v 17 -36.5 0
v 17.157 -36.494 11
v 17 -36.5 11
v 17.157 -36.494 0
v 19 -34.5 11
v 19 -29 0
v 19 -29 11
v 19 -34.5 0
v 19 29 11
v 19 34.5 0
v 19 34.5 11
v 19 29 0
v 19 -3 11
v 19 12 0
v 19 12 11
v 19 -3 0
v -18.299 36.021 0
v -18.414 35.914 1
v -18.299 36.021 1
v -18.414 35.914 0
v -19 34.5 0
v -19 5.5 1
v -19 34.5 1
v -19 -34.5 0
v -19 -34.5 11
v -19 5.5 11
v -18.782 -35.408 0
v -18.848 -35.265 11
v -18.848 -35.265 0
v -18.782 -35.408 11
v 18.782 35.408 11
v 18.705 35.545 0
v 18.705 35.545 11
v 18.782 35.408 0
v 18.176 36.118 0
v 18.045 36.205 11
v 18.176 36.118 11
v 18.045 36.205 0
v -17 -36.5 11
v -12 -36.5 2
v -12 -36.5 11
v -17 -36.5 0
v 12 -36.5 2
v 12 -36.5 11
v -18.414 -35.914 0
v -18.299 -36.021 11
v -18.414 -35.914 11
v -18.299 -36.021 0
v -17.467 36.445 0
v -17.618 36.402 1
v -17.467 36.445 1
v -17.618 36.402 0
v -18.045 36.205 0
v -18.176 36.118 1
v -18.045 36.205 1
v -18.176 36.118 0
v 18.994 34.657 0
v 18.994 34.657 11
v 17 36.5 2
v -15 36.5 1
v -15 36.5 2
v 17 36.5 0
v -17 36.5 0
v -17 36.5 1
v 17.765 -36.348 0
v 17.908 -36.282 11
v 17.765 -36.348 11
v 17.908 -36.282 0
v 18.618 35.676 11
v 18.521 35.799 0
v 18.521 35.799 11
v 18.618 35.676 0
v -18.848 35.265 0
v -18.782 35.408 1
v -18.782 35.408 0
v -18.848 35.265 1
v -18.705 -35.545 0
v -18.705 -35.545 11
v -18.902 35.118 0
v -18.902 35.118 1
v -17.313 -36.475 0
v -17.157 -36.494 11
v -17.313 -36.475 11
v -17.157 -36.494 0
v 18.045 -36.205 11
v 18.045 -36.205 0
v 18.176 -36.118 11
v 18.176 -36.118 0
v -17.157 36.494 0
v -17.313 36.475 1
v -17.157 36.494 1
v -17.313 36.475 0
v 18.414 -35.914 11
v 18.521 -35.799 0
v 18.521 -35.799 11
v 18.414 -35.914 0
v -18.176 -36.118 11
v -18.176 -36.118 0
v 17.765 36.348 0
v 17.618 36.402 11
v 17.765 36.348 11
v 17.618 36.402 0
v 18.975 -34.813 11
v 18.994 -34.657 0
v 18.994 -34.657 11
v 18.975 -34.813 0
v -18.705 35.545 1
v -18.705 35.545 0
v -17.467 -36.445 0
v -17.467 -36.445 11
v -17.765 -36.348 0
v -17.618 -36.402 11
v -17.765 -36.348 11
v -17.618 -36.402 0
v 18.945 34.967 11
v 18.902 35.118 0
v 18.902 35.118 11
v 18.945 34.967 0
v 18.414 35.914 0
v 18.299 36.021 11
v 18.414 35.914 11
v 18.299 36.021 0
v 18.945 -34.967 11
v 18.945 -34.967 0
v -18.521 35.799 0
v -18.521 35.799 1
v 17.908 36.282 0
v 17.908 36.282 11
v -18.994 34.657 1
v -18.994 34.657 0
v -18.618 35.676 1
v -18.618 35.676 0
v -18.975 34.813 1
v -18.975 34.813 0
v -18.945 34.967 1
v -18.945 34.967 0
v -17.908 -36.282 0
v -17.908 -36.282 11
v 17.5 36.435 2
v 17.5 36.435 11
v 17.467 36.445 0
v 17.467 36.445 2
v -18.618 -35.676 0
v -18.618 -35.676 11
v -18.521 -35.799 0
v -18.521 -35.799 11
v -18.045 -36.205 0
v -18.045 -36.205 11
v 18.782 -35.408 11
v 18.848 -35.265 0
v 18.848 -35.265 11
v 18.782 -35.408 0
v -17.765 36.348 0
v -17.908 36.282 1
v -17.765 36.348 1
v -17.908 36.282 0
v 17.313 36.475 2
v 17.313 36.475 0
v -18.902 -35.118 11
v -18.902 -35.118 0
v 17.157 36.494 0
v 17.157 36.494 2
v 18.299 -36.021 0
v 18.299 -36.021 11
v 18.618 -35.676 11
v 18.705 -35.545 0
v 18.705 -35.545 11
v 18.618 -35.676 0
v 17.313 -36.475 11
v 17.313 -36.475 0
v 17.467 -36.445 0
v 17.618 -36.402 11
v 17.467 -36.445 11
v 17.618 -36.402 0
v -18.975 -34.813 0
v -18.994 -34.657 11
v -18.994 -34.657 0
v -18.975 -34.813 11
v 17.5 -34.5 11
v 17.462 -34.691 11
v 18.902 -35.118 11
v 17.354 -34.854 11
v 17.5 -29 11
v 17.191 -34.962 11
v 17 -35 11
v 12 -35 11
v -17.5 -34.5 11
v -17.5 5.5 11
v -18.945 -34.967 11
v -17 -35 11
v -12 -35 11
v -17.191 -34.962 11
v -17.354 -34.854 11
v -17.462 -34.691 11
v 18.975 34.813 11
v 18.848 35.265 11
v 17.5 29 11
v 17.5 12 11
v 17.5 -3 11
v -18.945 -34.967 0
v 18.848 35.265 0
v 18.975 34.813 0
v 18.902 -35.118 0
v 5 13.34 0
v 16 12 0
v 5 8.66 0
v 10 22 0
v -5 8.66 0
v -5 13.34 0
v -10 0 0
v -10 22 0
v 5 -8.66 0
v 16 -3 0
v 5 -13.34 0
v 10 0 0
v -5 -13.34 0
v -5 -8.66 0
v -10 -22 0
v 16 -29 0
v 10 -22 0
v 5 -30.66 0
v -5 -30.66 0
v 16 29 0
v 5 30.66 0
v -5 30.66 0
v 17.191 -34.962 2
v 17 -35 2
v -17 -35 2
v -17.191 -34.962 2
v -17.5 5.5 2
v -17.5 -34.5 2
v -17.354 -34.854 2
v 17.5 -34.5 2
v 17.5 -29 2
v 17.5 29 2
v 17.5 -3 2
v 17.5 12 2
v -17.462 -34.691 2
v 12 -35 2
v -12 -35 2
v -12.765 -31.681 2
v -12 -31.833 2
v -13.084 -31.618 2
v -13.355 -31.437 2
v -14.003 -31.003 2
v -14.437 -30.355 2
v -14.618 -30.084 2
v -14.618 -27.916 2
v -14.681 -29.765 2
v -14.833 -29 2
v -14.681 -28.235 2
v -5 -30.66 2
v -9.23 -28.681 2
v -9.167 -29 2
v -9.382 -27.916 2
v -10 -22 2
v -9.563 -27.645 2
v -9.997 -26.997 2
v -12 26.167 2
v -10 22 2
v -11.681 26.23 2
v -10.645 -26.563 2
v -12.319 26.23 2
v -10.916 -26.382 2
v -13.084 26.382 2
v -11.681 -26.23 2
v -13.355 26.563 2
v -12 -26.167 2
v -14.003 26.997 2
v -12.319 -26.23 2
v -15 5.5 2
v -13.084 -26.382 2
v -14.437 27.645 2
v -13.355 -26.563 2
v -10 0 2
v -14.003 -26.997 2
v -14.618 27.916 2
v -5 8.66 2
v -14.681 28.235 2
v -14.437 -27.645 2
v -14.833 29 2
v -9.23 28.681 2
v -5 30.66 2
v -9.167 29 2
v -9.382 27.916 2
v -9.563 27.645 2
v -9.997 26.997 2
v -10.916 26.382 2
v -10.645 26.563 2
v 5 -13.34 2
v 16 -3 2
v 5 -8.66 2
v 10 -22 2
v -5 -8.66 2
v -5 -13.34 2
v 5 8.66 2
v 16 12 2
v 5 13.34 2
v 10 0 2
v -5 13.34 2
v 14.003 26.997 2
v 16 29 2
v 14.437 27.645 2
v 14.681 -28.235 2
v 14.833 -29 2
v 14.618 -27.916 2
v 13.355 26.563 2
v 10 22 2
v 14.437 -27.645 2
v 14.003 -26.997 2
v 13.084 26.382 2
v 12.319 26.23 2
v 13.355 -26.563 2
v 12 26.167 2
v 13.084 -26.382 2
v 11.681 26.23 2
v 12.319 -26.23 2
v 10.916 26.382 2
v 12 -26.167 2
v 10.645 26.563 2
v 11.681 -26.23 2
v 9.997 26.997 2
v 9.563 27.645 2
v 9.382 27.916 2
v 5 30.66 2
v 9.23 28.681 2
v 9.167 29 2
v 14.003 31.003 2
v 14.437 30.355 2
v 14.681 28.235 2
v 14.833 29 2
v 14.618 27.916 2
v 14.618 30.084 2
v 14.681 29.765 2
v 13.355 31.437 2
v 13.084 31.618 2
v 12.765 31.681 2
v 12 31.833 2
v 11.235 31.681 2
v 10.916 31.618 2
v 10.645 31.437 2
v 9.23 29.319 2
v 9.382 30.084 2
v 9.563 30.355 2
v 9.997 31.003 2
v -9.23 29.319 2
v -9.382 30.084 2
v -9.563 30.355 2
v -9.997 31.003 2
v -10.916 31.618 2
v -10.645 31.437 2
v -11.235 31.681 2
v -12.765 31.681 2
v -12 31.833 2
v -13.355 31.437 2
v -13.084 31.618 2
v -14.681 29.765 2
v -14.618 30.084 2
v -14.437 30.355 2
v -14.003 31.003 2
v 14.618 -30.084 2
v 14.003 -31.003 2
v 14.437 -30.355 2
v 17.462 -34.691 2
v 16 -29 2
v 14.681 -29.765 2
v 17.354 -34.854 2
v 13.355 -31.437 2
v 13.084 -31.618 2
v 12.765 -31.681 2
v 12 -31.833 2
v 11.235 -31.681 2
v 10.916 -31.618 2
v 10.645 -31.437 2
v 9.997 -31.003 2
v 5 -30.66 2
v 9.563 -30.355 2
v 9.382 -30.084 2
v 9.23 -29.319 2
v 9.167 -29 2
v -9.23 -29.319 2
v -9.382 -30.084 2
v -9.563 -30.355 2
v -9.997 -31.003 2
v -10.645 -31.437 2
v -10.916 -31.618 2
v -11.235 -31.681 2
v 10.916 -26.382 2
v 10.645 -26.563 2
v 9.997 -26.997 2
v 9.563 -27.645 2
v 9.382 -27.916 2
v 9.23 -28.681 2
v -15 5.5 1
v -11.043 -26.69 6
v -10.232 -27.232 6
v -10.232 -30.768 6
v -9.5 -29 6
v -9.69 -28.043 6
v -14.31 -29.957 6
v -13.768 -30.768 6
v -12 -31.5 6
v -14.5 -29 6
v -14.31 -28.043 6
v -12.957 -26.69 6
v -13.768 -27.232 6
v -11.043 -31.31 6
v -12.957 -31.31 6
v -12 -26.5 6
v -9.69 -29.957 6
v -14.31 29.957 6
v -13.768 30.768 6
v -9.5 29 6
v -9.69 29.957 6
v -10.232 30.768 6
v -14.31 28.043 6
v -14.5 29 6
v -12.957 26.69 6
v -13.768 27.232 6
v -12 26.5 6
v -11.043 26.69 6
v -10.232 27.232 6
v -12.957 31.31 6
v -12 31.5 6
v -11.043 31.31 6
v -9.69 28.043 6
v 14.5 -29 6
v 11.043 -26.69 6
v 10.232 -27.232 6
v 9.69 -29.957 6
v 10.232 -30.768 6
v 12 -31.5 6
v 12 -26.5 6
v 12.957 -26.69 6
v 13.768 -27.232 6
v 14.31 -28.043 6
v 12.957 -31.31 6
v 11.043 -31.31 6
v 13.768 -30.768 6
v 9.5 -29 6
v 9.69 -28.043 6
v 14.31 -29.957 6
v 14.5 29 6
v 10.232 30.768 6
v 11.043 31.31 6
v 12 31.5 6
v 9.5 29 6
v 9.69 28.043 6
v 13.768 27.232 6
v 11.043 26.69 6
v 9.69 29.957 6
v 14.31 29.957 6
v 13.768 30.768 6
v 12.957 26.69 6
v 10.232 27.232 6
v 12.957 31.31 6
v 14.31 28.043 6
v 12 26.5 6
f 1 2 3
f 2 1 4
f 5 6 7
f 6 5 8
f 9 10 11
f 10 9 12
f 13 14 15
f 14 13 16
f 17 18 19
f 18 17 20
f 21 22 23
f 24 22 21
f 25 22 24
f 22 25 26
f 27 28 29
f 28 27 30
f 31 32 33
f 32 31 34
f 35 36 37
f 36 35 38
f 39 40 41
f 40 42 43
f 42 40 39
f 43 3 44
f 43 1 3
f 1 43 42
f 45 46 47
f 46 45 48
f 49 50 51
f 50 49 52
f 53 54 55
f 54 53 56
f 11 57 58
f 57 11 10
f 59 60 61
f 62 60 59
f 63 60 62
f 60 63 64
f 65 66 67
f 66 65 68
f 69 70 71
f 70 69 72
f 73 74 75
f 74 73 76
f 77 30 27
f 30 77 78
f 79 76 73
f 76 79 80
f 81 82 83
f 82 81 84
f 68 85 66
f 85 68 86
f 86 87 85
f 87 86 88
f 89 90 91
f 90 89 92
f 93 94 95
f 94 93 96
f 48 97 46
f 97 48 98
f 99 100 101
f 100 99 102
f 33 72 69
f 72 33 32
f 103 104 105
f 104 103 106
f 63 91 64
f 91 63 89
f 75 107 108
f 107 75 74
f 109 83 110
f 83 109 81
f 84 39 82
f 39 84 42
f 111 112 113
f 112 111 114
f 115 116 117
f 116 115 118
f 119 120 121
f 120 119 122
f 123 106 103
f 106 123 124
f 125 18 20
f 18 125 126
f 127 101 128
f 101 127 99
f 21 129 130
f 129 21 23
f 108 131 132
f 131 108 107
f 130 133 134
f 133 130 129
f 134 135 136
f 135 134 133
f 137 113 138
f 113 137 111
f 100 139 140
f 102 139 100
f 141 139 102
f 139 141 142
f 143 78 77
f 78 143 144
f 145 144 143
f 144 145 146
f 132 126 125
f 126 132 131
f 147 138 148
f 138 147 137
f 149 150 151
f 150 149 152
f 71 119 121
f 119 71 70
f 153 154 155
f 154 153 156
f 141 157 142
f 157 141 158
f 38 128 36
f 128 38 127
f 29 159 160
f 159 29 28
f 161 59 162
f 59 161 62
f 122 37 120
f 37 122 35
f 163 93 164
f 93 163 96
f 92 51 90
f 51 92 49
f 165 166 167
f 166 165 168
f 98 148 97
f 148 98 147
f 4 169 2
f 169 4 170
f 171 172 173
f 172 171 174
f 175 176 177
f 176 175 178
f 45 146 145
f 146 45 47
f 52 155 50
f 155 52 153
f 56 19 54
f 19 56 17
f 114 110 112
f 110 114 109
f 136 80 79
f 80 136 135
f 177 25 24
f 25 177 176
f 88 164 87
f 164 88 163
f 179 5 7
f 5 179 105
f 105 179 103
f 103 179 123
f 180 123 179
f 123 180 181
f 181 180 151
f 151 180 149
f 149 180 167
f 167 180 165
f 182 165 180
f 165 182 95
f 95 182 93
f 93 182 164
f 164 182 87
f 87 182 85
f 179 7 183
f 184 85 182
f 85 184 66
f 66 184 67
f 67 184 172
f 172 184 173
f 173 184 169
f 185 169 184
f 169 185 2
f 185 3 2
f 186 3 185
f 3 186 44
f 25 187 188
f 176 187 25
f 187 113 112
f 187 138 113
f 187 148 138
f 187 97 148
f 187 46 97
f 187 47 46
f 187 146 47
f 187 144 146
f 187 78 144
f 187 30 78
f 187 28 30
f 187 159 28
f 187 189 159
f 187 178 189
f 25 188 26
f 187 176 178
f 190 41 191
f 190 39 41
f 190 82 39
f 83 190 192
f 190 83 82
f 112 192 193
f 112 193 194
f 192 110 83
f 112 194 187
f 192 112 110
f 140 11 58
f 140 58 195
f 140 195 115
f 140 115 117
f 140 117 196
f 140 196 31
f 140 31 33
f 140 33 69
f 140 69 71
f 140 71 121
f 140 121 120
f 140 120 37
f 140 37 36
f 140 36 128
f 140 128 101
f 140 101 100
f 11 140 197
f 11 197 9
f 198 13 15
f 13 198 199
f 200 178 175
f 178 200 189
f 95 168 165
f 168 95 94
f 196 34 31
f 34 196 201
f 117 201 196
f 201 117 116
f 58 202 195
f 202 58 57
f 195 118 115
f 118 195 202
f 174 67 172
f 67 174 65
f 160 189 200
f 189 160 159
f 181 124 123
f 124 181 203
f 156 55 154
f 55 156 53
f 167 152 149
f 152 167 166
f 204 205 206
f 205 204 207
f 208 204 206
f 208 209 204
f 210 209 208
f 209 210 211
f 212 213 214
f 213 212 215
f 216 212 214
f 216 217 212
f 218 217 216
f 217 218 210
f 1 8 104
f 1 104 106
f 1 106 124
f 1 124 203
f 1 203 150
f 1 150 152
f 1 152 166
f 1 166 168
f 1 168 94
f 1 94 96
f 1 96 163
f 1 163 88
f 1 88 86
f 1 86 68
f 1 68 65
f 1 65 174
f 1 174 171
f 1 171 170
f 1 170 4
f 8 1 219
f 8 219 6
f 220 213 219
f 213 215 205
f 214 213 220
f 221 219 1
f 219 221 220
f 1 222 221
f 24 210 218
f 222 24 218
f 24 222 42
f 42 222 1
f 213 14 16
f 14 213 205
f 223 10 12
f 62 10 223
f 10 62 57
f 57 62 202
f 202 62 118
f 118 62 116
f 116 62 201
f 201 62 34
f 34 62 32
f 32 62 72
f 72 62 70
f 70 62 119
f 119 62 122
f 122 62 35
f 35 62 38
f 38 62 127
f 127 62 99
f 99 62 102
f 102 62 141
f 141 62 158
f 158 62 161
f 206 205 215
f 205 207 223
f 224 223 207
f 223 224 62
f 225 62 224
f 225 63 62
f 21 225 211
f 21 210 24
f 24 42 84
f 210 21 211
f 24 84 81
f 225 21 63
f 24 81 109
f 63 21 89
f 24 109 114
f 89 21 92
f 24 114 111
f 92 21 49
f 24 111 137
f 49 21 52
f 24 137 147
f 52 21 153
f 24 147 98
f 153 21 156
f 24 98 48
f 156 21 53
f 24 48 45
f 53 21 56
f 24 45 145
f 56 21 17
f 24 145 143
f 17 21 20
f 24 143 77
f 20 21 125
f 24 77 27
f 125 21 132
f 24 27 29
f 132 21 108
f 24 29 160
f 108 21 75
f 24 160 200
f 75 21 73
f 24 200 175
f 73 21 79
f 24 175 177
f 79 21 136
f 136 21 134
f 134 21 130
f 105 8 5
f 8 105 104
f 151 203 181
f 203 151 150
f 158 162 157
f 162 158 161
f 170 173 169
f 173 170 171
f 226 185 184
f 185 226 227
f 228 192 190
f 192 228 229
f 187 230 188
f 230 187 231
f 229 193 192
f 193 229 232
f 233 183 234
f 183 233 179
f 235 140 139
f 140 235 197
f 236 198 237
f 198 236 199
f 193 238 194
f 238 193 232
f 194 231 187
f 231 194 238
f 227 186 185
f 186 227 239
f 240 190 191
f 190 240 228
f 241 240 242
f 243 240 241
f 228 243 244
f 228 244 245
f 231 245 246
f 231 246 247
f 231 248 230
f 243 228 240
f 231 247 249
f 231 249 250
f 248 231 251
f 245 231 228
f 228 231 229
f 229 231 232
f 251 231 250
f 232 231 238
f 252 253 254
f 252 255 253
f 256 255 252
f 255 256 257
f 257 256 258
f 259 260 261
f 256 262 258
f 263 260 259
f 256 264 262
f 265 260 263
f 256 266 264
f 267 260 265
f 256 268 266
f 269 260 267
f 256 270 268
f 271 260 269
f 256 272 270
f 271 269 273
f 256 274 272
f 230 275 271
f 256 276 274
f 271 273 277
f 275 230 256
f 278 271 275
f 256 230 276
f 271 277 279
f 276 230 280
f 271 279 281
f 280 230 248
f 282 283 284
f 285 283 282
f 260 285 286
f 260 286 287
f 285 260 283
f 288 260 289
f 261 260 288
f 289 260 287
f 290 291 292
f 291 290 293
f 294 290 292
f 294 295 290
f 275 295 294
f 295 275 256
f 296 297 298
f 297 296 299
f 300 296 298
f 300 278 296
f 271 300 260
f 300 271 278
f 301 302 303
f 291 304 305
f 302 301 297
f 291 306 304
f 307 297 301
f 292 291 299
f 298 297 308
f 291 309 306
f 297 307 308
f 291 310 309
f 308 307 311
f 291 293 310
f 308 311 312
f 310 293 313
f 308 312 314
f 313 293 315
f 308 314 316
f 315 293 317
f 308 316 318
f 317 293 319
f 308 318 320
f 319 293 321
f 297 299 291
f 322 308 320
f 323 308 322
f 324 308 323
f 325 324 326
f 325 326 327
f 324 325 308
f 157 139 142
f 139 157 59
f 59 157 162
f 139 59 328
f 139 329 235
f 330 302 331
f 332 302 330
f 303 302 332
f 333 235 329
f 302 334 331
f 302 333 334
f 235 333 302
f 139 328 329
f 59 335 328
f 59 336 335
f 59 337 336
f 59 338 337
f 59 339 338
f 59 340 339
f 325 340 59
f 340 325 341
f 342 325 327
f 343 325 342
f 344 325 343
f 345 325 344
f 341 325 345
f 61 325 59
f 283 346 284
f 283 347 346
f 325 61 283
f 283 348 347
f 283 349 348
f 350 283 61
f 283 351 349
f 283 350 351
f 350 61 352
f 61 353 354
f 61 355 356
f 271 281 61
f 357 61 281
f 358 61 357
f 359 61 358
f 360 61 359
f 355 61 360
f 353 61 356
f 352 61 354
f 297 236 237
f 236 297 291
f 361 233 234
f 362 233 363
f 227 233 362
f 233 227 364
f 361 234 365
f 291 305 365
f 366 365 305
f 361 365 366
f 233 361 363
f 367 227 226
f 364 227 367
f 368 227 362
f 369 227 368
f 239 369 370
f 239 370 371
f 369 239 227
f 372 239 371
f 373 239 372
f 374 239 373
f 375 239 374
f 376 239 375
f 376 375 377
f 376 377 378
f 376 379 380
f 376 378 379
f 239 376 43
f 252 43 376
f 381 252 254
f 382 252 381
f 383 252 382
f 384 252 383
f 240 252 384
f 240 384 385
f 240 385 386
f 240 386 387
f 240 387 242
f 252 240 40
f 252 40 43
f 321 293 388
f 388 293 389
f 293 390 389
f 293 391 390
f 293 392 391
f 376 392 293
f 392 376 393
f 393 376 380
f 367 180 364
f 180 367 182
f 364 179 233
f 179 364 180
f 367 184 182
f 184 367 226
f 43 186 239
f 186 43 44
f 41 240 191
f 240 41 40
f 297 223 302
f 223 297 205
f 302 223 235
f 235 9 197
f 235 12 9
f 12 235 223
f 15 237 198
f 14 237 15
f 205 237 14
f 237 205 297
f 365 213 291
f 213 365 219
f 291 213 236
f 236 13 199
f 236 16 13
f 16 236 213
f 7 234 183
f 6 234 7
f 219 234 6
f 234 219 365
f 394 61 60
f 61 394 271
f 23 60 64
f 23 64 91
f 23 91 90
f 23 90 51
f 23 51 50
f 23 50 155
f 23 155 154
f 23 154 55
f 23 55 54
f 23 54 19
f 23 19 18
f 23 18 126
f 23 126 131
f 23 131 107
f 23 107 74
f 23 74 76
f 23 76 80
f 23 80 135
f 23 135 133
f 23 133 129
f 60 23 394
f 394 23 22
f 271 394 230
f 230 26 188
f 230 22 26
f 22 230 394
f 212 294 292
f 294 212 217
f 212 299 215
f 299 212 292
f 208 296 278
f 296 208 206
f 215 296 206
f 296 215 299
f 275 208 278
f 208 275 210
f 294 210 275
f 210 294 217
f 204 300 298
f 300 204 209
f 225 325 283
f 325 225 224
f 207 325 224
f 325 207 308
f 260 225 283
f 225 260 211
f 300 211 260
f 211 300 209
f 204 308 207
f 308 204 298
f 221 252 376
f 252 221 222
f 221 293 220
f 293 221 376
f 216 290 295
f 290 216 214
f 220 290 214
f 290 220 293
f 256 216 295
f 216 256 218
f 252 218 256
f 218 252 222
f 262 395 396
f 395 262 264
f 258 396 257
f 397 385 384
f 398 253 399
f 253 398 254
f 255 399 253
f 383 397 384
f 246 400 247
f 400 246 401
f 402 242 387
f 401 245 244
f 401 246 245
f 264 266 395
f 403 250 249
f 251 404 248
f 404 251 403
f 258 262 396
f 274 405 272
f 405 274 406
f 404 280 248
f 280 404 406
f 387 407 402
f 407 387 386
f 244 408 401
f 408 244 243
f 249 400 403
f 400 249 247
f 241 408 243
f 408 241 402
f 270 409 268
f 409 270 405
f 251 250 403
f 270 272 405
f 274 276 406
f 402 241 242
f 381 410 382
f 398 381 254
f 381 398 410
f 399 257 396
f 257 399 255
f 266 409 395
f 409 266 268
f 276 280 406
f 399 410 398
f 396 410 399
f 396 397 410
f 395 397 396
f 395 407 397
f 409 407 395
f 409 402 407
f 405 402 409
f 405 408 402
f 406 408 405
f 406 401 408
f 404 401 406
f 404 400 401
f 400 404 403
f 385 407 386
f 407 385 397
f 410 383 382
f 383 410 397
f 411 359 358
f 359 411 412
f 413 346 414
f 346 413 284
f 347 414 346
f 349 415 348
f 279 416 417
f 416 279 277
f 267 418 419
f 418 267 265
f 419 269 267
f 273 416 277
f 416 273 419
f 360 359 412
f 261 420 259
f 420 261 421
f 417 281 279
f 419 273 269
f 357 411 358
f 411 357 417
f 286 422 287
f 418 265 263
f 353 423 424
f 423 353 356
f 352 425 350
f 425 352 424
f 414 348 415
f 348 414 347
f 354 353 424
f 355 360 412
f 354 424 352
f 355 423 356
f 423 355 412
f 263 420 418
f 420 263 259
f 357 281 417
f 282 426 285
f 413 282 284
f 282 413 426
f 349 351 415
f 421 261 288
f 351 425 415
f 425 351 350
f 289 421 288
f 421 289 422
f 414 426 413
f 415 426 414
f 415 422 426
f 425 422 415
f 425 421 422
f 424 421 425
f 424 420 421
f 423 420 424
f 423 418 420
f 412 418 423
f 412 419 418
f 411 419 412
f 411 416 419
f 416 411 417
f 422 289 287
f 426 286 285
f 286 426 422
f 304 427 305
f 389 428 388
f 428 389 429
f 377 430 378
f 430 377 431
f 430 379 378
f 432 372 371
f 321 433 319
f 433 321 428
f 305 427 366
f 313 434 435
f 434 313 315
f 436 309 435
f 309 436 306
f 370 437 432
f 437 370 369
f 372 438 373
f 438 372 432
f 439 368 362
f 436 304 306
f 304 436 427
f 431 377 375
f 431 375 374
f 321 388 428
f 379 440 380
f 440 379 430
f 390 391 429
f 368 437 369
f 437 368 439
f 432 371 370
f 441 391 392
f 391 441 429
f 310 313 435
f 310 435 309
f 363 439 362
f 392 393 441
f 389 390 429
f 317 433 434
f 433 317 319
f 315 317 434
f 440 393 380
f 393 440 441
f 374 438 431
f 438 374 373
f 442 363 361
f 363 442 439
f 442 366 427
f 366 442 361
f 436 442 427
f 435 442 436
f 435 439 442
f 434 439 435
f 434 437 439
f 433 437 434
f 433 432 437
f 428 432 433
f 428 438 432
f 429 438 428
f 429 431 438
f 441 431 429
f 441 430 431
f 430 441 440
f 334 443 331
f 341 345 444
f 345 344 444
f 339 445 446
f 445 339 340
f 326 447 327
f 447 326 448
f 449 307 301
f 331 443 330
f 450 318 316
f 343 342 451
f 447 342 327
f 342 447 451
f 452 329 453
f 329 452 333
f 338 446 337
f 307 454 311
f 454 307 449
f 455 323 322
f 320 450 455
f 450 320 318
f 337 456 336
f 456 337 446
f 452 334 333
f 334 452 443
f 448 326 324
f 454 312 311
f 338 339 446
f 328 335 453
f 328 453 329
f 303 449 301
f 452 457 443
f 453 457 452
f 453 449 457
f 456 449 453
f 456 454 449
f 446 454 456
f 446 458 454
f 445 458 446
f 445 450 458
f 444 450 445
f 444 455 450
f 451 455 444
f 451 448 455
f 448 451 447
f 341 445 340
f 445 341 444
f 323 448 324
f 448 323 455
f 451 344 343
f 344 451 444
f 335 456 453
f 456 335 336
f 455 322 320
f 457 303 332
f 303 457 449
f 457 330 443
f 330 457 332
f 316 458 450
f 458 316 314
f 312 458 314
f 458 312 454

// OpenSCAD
// file: pibase.scad
// pibase.scad
// This is the back for the pi zero



module pibase(){
    
// base borrowed from pieye
difference(){
    color("yellow")
    linear_extrude(height=5)
    offset(r=2,$fn=80)    
    square(size=[30,65],center=true);

    translate([0,0,1.5])
    color("orange")
    linear_extrude(height=5)
    offset(r=0.5,$fn=16)    
    square(size=[30,65],center=true);

    translate([-8.5,-36,1.5])
    color("red")
    cube([17,5,5]);

    translate([-8.5,30,1.5])
    color("red")
    cube([17,5,5]);

    translate([-14,30,12])
    color("green")
    cube([28,5,5]);

    translate([0,0,-1])
    cylinder(r=9,h=5,$fn=6);
    translate([0,20,-1])
    cylinder(r=9,h=5,$fn=6);
    translate([0,-20,-1])
    cylinder(r=9,h=5,$fn=6);


}

// posts to support PCB
color("pink")
translate([-15+3.2,-32.0+3,1]){
    cylinder(r=2.5,h=3,$fn=16);
    cylinder(r=1,h=4,$fn=16);
}
color("pink")
translate([15-3.2,-32.0+3,1]){
    cylinder(r=2.5,h=3,$fn=16);
    cylinder(r=1,h=4,$fn=16);
}
translate([-14.75+3.2,32.25-3,1]){
    cylinder(r=2.5,h=3,$fn=16);
    cylinder(r=1,h=4,$fn=16);
}
translate([14.75-3.2,32.25-3,1]){
    cylinder(r=2.5,h=3,$fn=16);
    cylinder(r=1,h=4,$fn=16);
}

} // end module pibase

pibase();
// main file
// pilid.scad
// This is the lid for the pi zero

use <pibase.scad>

module pilid(){
tol=0.2;
    
hi=11.0;    
// base borrowed from pieye
difference(){
    color("yellow")
    linear_extrude(height=hi)
    offset(r=2,$fn=80)    
    square(size=[30+4,65+4],center=true);

    translate([0,0,2])
    color("orange")
    linear_extrude(height=hi)
    offset(r=0.5,$fn=16)    
    square(size=[30+4,65+4],center=true);

    translate([-12,-38,2])
    color("red")
    cube([24,5,hi]);
    
    translate([-17.5,32,2])
    color("green")
    cube([35,5,hi]);

    translate([16,12,-2])
    color("blue")
    cube([5,17,hi+6]);

    translate([16,-29,-2])
    color("pink")
    cube([5,26,hi+6]);

    translate([-20,5.5,1])
    color("green")
    cube([5,50,hi+1]);
    
    // vent holes
    translate([0,0,-1])
    cylinder(r=10,h=25,$fn=6);
    translate([0,22,-1])
    cylinder(r=10,h=25,$fn=6);
    translate([0,-22,-1])
    cylinder(r=10,h=25,$fn=6);
}

// posts to support PCB
translate([-15+3,-32.0+3,0]){
    cylinder(r1=3,r2=2.5,h=hi-5,$fn=16);
    //cylinder(r=1,h=4,$fn=16);
}
translate([-15+3,32.0-3,0]){
    cylinder(r1=3,r2=2.5,h=hi-5,$fn=16);
    //cylinder(r=0.8,h=4,$fn=16);
}
translate([15-3,-32.0+3,0]){
    cylinder(r1=3,r2=2.5,h=hi-5,$fn=16);
    //cylinder(r=0.8,h=4,$fn=16);
}
translate([15-3,32.0-3,0]){
    cylinder(r1=3,r2=2.5,h=hi-5,$fn=16);
    //cylinder(r=0.8,h=4,$fn=16);
}

} // end module lid2

pilid();

/*
color("cyan")
translate([0,0,11.0])
rotate([0,180,0])
pibase();
*/
